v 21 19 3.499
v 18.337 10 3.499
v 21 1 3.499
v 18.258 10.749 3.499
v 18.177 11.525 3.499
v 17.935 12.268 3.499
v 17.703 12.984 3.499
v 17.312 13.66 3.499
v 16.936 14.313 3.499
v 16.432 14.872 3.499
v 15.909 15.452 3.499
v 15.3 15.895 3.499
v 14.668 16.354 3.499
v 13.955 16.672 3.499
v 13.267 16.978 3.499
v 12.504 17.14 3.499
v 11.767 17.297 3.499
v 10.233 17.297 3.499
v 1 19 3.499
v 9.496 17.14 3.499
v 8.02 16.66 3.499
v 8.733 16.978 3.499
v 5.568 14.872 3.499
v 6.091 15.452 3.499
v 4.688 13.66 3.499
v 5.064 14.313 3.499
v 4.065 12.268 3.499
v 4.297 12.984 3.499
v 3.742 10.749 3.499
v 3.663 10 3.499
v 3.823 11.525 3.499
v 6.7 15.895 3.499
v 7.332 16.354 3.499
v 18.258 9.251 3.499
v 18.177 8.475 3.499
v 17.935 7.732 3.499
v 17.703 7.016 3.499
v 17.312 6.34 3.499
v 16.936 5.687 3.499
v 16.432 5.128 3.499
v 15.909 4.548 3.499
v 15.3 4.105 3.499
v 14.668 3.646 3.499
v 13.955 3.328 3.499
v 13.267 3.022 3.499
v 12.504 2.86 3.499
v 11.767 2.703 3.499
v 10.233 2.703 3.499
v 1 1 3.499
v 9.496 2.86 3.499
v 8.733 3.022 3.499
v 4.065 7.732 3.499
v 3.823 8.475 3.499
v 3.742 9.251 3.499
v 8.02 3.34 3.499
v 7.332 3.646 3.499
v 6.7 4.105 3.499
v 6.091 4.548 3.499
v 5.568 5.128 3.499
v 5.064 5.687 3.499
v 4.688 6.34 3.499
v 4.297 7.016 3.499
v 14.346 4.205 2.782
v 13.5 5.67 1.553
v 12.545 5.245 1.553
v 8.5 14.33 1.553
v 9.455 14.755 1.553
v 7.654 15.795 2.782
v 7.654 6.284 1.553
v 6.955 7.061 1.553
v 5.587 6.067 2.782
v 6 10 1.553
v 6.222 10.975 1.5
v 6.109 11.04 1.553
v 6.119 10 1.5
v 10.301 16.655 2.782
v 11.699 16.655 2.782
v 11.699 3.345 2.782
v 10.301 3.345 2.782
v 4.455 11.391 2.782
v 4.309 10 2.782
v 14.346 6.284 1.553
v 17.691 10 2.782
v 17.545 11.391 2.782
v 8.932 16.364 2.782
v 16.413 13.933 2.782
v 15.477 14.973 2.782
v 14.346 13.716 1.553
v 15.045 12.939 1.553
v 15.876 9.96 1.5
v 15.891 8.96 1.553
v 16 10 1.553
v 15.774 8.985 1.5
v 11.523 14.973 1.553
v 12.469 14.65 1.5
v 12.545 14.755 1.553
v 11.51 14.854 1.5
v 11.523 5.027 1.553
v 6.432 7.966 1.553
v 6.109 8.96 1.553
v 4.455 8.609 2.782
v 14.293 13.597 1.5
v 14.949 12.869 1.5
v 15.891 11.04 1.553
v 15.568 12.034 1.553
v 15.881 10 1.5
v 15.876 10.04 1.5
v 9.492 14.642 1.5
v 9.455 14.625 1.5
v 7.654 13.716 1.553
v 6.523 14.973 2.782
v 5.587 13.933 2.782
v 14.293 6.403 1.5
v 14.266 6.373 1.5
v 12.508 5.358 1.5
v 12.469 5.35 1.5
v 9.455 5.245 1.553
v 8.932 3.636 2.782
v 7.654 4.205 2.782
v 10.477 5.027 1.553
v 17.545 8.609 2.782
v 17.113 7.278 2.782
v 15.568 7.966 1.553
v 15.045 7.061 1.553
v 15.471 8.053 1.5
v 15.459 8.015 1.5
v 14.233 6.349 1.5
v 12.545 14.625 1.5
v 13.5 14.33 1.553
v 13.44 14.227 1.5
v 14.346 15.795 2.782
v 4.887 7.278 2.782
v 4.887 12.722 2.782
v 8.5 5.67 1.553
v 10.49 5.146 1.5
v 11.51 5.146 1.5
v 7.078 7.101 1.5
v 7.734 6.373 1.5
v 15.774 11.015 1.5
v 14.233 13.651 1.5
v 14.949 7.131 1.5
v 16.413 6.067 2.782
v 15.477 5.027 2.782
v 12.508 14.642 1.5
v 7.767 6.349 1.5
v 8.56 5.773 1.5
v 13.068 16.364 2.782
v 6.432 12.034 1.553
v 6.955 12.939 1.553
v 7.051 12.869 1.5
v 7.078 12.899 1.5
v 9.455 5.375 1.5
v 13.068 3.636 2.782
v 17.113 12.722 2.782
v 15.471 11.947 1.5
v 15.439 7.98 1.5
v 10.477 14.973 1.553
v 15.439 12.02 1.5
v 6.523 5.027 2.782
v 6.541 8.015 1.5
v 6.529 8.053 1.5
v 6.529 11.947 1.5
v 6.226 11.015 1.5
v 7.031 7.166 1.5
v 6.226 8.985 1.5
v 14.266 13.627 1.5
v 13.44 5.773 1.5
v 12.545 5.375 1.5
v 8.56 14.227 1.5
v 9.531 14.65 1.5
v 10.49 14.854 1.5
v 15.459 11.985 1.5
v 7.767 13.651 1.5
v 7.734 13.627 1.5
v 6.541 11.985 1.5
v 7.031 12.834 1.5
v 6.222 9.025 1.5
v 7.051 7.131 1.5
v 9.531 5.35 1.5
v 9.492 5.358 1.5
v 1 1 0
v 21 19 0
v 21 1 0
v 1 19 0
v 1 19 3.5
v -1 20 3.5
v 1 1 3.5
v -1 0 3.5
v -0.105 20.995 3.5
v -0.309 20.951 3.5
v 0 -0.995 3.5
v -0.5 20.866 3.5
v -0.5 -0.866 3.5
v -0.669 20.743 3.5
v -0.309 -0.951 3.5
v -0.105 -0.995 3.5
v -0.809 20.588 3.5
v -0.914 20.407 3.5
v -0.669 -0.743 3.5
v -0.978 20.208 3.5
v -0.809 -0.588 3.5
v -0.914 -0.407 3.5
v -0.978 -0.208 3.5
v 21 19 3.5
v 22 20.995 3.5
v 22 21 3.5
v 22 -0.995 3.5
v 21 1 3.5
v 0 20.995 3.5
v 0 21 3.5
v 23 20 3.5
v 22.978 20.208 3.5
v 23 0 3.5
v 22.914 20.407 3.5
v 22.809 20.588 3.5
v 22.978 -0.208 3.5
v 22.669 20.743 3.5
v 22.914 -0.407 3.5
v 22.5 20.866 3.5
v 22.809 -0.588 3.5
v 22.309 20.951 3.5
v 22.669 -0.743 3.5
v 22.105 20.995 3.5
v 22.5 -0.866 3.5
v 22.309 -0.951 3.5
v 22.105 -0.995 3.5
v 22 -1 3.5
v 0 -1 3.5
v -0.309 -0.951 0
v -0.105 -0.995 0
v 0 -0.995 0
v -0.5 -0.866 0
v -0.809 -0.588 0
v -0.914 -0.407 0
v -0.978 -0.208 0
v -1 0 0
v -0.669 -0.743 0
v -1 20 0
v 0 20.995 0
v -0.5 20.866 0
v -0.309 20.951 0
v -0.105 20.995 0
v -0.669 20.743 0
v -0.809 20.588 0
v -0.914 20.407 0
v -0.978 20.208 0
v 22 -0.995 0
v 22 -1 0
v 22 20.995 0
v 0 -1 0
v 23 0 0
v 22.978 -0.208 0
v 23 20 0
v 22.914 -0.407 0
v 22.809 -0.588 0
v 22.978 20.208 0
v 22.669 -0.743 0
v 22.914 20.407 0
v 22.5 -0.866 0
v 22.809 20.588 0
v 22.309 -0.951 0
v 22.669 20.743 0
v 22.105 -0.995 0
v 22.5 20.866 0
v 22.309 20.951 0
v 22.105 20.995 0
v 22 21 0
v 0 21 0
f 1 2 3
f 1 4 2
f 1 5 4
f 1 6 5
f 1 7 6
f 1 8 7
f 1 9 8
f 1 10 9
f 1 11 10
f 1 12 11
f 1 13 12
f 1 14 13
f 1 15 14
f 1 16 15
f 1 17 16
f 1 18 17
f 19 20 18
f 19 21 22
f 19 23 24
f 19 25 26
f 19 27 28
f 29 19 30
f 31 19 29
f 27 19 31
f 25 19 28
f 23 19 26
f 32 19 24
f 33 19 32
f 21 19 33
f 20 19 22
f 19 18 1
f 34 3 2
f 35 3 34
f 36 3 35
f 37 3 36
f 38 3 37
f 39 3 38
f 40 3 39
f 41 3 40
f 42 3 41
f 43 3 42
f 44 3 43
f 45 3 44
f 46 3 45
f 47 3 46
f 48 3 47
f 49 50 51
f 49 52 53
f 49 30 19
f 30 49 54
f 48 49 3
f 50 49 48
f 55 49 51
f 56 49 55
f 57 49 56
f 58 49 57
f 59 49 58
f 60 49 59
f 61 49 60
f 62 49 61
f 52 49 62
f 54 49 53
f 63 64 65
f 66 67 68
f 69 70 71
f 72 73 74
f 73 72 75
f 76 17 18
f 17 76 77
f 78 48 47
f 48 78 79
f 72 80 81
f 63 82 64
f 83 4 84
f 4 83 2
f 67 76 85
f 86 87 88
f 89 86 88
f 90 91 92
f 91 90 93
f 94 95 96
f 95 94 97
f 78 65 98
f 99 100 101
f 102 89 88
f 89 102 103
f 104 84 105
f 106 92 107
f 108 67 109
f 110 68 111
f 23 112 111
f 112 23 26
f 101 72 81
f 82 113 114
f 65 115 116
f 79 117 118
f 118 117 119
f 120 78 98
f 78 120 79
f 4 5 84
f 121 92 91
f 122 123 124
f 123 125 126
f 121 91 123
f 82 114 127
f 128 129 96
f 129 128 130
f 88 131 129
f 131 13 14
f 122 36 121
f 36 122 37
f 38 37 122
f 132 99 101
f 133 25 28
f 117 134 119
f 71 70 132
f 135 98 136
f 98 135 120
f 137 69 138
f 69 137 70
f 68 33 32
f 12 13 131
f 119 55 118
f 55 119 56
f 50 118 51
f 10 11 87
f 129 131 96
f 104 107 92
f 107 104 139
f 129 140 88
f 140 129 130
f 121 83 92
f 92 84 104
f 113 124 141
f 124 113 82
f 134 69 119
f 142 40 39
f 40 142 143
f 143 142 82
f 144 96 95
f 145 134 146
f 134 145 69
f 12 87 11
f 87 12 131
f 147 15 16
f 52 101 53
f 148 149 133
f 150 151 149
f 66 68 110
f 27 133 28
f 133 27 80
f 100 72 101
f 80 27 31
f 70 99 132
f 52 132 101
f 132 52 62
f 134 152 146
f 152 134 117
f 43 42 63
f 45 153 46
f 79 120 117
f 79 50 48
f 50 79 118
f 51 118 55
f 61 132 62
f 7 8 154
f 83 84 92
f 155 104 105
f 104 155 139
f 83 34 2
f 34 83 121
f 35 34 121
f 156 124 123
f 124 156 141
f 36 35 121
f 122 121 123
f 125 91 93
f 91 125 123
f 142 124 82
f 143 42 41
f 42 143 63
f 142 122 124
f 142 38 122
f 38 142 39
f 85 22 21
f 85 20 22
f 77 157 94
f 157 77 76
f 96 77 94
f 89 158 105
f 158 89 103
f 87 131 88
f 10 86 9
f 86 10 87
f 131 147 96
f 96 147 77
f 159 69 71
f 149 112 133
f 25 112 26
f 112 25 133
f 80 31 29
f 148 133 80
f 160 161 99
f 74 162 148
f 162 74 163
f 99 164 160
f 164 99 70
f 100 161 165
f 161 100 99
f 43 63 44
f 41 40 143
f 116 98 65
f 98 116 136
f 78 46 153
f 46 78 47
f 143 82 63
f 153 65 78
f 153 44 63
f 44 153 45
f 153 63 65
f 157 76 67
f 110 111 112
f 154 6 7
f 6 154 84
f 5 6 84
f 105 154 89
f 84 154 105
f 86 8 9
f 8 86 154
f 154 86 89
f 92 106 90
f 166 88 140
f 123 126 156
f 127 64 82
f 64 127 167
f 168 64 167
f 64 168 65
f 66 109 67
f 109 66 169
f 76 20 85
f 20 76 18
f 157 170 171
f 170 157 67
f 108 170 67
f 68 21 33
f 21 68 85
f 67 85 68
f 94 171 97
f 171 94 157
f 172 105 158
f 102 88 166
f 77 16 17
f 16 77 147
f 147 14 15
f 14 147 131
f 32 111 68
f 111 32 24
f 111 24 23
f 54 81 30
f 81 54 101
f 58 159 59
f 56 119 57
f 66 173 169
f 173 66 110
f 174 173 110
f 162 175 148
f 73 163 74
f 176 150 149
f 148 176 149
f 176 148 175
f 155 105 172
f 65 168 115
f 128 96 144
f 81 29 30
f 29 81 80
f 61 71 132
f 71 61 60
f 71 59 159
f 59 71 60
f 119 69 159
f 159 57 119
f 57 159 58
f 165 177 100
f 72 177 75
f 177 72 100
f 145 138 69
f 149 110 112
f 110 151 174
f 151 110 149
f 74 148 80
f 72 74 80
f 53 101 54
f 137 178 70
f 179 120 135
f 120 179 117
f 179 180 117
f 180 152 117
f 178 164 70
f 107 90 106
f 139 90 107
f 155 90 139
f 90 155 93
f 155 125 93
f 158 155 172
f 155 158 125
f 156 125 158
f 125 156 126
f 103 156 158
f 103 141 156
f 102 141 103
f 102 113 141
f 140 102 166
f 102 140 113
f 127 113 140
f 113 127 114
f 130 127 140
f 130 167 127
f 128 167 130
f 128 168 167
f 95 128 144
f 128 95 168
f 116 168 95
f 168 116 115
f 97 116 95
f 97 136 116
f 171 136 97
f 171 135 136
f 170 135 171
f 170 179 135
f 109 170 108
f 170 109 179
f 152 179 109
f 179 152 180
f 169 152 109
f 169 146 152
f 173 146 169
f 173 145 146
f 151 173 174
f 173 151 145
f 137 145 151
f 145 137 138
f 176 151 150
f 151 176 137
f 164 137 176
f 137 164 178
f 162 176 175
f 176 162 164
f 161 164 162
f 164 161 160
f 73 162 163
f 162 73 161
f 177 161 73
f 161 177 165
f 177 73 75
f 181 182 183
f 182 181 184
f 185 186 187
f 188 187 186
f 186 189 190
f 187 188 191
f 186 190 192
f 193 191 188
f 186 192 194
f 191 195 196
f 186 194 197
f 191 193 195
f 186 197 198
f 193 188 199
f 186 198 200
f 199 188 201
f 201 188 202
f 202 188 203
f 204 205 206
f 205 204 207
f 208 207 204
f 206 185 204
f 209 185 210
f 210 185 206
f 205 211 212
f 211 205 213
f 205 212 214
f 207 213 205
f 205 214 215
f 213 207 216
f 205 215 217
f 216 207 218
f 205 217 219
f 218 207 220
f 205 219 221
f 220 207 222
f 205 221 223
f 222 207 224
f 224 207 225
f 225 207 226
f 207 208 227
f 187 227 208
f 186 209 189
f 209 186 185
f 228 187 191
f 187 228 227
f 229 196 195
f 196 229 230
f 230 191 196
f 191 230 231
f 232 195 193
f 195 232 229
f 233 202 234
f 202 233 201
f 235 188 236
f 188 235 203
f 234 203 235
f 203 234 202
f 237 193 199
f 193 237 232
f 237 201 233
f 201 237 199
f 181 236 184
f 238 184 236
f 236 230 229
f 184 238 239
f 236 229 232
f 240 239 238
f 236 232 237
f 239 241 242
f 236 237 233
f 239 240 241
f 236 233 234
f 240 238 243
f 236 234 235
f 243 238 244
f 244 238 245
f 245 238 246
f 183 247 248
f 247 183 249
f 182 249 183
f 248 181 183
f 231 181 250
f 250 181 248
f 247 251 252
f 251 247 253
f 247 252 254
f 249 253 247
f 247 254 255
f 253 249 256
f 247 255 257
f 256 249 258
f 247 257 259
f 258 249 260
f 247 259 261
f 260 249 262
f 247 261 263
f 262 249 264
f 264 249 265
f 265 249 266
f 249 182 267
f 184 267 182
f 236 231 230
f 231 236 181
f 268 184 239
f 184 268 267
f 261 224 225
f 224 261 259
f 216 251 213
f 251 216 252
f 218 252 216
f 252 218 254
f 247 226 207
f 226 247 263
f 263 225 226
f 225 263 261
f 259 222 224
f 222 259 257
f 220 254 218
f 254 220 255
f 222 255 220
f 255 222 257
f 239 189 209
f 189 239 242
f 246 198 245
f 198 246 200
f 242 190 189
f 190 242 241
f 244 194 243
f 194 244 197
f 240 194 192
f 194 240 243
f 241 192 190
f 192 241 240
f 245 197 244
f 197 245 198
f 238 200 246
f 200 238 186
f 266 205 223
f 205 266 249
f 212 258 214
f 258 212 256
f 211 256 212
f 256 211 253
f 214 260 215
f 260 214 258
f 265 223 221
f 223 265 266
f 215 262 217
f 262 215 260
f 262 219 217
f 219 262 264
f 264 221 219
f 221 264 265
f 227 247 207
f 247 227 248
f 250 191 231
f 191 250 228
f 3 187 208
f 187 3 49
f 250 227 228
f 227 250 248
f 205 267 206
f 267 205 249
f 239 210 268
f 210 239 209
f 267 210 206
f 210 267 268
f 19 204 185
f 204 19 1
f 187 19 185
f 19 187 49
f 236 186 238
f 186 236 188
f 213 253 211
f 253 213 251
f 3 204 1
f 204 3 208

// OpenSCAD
scaling=1;
board_y = 10;
board_x = 12;
board_length = board_y*scaling;
board_width = board_x*scaling;
rim = 5;
stencil_height = 0.3;
bottom_height  = 1.5;
board_height = 1.6;
tolerance = 0.1;
round_corners = 1;
board_outline = "wlan-thermo-front-panel-F_Paste.dxf";

smaller_edge=min(board_width, board_length);
total_height=board_height + tolerance + stencil_height;
bottom_distance =  bottom_height - 0.001;

ejection_sphere_radius= smaller_edge;
ring_radius= smaller_edge/2 + rim/2;
z_offset = ejection_sphere_radius * (1 - sqrt(1-pow(ring_radius/ejection_sphere_radius,2)));

$fn=30;

union() {
cylinder(total_height + bottom_height, 1);
translate([board_width+rim*2, 0, 0]) 
  cylinder(total_height + bottom_height, 1);
translate([0, board_length+rim*2, 0])
  cylinder(total_height + bottom_height, 1);
translate([board_width+rim*2, board_length+rim*2, 0])
  cylinder(total_height + bottom_height, 1);

translate([0,-1,0]) 
  cube([board_width+rim*2,2,total_height + bottom_height]);
translate([0,board_length+rim*2 - 1,0]) 
  cube([board_width+rim*2,2,total_height + bottom_height]);
translate([-1,0,0])
  cube([2,board_length+rim*2,total_height + bottom_height]);
translate([board_width+rim*2-1,0,0])
  cube([2,board_length+rim*2,total_height + bottom_height]);

translate([0,0,bottom_distance])
  union() {
    difference() {
      difference() {

        cube([board_width+rim*2, board_length+rim*2, total_height]);
          translate([rim,rim,-tolerance]) minkowski() {
          scale([scaling,scaling,1])
          linear_extrude(stencil_height + board_height + tolerance + 0.1) import(board_outline);
          cube(tolerance);
          };
      };

      
      translate([board_width/2+rim, board_length/2+rim, ejection_sphere_radius + total_height -  z_offset + tolerance])
        sphere(ejection_sphere_radius);  
      
    };
      translate([0,0, -1 * bottom_distance])
        cube([board_width+rim*2, board_length+rim*2, bottom_height]);
  };
  
  /*
  
  minkowski() {
          scale([scaling,scaling,1])
          linear_extrude(stencil_height + board_height + tolerance + 0.1) import(board_outline);
          cube(tolerance);
          };
          */
};
